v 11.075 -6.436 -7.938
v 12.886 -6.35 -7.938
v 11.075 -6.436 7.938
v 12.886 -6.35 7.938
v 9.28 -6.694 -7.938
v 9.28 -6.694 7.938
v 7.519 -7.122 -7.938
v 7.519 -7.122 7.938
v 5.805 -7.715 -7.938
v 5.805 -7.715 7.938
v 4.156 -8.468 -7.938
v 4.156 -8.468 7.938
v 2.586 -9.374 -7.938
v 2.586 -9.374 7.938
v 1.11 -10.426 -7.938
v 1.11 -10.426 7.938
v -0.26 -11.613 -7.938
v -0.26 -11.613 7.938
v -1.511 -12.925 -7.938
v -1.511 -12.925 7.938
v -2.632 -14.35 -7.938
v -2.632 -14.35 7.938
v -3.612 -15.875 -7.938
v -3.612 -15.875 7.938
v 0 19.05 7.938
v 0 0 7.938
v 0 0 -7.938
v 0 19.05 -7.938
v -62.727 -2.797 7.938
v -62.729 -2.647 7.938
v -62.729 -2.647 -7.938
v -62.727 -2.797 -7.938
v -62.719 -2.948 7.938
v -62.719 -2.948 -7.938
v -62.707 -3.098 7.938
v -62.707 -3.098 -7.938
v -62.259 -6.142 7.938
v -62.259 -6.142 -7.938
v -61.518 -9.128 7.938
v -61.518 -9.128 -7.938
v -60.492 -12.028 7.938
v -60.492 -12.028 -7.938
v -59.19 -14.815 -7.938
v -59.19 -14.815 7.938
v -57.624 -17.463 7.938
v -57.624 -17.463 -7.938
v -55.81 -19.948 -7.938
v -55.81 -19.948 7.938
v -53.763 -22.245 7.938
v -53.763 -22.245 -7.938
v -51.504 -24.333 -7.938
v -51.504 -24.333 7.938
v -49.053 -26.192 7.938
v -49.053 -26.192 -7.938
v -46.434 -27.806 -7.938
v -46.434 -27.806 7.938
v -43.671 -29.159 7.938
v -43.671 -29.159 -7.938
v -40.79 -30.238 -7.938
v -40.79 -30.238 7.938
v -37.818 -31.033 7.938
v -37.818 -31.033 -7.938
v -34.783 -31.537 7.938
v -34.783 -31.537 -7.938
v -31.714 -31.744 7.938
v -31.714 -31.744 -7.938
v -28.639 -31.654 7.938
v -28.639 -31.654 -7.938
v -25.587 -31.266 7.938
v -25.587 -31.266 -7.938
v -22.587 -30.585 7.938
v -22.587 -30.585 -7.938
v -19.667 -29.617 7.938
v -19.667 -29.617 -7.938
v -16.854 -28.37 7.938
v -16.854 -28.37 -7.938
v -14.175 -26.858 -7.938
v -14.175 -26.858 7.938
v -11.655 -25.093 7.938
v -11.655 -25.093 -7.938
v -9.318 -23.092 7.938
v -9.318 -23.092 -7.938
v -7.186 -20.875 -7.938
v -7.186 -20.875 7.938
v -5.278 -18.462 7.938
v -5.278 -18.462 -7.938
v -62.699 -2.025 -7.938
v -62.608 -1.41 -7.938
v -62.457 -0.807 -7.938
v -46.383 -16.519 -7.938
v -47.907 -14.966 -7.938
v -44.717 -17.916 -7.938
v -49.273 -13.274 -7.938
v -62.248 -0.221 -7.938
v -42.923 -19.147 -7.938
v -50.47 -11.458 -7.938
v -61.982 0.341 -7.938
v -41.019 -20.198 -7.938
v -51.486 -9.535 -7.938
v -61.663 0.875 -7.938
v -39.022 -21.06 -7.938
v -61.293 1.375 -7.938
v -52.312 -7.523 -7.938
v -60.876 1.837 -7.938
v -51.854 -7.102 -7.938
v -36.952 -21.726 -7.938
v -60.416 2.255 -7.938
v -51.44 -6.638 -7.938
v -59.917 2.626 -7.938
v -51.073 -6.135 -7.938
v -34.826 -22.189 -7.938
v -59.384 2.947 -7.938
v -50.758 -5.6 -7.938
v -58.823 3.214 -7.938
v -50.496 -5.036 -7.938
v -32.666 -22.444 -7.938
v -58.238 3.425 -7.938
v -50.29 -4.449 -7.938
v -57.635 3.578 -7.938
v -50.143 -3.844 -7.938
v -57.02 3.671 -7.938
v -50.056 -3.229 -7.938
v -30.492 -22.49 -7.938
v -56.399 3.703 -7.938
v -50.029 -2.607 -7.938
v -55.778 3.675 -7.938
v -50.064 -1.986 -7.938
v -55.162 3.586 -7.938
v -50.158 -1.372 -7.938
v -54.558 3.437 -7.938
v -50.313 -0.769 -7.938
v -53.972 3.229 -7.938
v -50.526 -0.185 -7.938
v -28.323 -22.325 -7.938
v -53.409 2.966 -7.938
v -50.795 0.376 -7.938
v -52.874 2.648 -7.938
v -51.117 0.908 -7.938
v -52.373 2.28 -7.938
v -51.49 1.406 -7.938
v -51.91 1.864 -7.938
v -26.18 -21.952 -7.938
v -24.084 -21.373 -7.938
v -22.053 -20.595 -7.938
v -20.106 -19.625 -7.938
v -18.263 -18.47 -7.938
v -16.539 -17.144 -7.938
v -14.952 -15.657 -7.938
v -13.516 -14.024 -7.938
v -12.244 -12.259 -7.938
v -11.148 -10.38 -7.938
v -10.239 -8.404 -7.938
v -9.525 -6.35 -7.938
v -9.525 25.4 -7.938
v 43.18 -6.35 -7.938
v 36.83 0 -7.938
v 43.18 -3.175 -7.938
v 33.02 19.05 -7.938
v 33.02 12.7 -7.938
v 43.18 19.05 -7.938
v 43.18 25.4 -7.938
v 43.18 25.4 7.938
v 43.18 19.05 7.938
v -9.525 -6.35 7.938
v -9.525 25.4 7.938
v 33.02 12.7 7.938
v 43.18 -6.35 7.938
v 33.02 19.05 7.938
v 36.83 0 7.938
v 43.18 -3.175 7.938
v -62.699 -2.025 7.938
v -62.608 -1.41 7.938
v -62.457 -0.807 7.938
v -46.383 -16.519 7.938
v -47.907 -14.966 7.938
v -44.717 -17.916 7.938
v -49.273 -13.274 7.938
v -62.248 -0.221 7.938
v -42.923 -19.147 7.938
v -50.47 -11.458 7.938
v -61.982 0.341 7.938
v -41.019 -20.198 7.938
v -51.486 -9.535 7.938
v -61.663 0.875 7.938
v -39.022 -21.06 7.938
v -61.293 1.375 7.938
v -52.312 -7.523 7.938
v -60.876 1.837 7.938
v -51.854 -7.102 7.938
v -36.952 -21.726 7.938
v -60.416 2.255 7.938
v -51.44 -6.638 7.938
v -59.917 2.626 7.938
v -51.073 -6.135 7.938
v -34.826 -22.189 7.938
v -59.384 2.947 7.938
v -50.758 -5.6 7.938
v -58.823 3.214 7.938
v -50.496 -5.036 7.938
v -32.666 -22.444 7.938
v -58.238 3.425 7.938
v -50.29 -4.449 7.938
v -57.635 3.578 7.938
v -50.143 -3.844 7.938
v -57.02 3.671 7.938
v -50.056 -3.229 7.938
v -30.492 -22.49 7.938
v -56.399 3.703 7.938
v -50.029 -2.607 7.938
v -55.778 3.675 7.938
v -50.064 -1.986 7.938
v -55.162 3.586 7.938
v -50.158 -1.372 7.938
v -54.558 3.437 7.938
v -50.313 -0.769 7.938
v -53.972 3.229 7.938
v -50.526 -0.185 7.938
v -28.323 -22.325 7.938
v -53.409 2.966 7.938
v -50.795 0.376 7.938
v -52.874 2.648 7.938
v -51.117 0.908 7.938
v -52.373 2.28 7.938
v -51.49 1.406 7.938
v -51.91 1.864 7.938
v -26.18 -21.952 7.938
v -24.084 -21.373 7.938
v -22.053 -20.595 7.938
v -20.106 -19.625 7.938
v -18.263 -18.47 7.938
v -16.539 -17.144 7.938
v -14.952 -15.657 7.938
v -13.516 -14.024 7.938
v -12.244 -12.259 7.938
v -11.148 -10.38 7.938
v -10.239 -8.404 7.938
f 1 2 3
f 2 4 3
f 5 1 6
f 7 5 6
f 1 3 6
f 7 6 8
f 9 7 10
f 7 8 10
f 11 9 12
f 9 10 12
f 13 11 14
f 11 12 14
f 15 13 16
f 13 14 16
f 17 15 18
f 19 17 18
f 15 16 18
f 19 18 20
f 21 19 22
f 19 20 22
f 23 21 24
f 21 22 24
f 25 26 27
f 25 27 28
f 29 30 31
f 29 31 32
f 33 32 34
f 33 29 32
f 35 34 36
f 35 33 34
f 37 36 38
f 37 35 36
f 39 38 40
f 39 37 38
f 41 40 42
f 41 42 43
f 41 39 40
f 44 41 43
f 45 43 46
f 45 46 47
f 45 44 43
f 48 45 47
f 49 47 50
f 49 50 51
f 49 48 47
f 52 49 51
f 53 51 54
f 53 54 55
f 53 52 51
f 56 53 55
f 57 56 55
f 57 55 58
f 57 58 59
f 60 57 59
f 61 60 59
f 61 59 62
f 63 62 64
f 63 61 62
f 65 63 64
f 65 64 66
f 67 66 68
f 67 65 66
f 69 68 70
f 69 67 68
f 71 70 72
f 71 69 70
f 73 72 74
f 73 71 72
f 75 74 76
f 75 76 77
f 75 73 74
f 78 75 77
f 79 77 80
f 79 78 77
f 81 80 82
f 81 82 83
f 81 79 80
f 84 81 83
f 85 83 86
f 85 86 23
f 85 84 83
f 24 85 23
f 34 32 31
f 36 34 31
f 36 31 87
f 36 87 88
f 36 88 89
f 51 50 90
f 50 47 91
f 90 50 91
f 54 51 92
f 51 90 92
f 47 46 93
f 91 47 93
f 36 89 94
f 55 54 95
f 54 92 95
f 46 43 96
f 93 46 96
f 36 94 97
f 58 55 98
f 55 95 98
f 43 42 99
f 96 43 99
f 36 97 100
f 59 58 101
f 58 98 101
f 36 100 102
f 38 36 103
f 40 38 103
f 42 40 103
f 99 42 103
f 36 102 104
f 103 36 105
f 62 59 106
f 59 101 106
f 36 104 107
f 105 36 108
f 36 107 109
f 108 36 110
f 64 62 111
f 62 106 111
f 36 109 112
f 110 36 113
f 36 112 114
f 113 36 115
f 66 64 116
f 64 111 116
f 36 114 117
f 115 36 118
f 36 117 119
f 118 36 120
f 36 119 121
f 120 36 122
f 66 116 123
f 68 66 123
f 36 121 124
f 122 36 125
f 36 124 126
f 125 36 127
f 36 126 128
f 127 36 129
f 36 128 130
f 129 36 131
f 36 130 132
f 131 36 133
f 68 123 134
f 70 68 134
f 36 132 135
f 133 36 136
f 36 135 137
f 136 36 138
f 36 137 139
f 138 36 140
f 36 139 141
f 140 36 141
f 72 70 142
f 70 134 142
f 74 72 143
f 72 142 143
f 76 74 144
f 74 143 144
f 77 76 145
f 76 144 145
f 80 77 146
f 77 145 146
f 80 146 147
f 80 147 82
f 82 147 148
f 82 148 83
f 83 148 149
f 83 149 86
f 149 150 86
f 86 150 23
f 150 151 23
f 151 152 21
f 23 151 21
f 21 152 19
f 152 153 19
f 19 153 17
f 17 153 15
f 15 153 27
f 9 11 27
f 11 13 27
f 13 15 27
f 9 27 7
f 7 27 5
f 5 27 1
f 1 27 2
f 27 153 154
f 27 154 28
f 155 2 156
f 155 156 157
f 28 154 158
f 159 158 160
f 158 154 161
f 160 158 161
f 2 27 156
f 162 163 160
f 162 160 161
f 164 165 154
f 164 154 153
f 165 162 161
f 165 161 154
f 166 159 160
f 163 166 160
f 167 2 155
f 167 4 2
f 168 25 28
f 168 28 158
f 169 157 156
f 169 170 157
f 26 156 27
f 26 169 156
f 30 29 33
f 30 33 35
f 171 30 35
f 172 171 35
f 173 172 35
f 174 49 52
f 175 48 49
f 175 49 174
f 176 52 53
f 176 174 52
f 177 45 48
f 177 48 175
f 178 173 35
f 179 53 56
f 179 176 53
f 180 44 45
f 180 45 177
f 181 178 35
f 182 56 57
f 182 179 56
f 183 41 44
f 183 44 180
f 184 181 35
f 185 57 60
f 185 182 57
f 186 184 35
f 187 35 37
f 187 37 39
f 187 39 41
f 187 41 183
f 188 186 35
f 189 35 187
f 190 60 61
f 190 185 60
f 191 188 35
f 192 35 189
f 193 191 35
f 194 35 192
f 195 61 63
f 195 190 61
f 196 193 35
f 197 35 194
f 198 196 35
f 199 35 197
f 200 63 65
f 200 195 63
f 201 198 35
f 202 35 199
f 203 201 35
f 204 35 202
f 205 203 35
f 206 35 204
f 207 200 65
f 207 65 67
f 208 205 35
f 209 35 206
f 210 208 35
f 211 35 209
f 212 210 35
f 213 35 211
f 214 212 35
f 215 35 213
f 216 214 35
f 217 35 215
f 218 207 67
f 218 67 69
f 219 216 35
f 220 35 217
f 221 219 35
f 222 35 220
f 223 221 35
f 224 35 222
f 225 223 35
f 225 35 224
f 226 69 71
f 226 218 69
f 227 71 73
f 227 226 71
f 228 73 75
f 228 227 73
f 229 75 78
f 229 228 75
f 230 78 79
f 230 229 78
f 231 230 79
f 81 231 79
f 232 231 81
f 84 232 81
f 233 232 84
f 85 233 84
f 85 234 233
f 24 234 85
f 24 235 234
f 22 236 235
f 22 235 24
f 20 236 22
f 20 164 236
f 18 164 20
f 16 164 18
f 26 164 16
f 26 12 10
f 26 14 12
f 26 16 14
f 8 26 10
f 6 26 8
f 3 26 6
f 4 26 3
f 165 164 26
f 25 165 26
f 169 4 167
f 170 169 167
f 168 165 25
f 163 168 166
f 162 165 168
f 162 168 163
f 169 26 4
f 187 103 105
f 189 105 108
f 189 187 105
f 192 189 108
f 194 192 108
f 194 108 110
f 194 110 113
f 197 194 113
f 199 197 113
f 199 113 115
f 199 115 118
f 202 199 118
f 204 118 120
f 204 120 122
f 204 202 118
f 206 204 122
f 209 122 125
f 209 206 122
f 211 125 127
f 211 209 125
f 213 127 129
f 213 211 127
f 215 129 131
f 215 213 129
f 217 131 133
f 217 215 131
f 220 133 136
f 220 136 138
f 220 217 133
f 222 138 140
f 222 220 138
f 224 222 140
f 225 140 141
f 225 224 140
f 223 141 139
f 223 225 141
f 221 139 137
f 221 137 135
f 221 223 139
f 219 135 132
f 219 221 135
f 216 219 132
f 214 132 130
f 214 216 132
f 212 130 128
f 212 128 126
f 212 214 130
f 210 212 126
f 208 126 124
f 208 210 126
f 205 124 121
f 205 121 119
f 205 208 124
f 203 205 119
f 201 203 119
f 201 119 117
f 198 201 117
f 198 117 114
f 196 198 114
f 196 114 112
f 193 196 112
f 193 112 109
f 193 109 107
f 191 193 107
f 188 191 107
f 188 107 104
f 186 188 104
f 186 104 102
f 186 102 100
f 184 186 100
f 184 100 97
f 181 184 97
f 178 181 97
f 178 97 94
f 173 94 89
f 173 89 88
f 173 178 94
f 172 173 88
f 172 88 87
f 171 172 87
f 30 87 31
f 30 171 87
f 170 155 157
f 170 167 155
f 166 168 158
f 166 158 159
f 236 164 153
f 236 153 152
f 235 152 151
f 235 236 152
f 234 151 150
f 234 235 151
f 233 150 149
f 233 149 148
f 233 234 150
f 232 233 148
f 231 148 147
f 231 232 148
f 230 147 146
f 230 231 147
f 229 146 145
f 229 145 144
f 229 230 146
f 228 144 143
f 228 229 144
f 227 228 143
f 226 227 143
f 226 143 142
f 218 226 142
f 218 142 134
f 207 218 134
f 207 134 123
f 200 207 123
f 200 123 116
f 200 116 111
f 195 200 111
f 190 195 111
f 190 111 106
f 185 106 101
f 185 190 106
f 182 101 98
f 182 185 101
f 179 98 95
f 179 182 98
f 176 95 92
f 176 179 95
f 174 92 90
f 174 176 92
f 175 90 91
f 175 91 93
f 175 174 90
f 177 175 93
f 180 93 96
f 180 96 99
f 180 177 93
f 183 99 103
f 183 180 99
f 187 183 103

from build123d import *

# Parameters (mm, degrees)
F0_DEPTH = 7.9375
F1_R     = 19.05


with BuildPart() as f0:
    # F2 (on Top) → F0 (new body, symmetric)
    with BuildSketch(Plane.XY):
        with BuildLine():
            Line((36.83, 0), (0, 0))
            Line((0, 0), (0, 19.05))
            Line((0, 19.05), (33.02, 19.05))
            Line((33.02, 19.05), (33.02, 12.7))
            Line((33.02, 12.7), (43.18, 19.05))
            Line((43.18, 19.05), (43.18, 25.4))
            Line((43.18, 25.4), (-9.525, 25.4))
            Line((-9.525, 25.4), (-9.525, -6.35))
            ThreePointArc((-9.525, -6.35), (-30.491958, -22.48979), (-52.311708, -7.523005))
            ThreePointArc((-52.311708, -7.523005), (-53.687003, 3.104461), (-62.729088, -2.646641))
            ThreePointArc((-62.729088, -2.646641), (-62.723566, -2.872597), (-62.707014, -3.098013))
            ThreePointArc((-62.707014, -3.098013), (-32.752866, -31.707391), (0, -6.35))
            Line((0, -6.35), (43.18, -6.35))
            Line((43.18, -6.35), (43.18, -3.175))
            Line((43.18, -3.175), (36.83, 0))
        make_face()
    extrude(amount=F0_DEPTH, both=True)

    # F1
    f1_edges = [f0.edges().sort_by_distance(p)[0] for p in [
        (0, -6.35, 0),
    ]]
    fillet(f1_edges, radius=F1_R)


solid = f0.part
